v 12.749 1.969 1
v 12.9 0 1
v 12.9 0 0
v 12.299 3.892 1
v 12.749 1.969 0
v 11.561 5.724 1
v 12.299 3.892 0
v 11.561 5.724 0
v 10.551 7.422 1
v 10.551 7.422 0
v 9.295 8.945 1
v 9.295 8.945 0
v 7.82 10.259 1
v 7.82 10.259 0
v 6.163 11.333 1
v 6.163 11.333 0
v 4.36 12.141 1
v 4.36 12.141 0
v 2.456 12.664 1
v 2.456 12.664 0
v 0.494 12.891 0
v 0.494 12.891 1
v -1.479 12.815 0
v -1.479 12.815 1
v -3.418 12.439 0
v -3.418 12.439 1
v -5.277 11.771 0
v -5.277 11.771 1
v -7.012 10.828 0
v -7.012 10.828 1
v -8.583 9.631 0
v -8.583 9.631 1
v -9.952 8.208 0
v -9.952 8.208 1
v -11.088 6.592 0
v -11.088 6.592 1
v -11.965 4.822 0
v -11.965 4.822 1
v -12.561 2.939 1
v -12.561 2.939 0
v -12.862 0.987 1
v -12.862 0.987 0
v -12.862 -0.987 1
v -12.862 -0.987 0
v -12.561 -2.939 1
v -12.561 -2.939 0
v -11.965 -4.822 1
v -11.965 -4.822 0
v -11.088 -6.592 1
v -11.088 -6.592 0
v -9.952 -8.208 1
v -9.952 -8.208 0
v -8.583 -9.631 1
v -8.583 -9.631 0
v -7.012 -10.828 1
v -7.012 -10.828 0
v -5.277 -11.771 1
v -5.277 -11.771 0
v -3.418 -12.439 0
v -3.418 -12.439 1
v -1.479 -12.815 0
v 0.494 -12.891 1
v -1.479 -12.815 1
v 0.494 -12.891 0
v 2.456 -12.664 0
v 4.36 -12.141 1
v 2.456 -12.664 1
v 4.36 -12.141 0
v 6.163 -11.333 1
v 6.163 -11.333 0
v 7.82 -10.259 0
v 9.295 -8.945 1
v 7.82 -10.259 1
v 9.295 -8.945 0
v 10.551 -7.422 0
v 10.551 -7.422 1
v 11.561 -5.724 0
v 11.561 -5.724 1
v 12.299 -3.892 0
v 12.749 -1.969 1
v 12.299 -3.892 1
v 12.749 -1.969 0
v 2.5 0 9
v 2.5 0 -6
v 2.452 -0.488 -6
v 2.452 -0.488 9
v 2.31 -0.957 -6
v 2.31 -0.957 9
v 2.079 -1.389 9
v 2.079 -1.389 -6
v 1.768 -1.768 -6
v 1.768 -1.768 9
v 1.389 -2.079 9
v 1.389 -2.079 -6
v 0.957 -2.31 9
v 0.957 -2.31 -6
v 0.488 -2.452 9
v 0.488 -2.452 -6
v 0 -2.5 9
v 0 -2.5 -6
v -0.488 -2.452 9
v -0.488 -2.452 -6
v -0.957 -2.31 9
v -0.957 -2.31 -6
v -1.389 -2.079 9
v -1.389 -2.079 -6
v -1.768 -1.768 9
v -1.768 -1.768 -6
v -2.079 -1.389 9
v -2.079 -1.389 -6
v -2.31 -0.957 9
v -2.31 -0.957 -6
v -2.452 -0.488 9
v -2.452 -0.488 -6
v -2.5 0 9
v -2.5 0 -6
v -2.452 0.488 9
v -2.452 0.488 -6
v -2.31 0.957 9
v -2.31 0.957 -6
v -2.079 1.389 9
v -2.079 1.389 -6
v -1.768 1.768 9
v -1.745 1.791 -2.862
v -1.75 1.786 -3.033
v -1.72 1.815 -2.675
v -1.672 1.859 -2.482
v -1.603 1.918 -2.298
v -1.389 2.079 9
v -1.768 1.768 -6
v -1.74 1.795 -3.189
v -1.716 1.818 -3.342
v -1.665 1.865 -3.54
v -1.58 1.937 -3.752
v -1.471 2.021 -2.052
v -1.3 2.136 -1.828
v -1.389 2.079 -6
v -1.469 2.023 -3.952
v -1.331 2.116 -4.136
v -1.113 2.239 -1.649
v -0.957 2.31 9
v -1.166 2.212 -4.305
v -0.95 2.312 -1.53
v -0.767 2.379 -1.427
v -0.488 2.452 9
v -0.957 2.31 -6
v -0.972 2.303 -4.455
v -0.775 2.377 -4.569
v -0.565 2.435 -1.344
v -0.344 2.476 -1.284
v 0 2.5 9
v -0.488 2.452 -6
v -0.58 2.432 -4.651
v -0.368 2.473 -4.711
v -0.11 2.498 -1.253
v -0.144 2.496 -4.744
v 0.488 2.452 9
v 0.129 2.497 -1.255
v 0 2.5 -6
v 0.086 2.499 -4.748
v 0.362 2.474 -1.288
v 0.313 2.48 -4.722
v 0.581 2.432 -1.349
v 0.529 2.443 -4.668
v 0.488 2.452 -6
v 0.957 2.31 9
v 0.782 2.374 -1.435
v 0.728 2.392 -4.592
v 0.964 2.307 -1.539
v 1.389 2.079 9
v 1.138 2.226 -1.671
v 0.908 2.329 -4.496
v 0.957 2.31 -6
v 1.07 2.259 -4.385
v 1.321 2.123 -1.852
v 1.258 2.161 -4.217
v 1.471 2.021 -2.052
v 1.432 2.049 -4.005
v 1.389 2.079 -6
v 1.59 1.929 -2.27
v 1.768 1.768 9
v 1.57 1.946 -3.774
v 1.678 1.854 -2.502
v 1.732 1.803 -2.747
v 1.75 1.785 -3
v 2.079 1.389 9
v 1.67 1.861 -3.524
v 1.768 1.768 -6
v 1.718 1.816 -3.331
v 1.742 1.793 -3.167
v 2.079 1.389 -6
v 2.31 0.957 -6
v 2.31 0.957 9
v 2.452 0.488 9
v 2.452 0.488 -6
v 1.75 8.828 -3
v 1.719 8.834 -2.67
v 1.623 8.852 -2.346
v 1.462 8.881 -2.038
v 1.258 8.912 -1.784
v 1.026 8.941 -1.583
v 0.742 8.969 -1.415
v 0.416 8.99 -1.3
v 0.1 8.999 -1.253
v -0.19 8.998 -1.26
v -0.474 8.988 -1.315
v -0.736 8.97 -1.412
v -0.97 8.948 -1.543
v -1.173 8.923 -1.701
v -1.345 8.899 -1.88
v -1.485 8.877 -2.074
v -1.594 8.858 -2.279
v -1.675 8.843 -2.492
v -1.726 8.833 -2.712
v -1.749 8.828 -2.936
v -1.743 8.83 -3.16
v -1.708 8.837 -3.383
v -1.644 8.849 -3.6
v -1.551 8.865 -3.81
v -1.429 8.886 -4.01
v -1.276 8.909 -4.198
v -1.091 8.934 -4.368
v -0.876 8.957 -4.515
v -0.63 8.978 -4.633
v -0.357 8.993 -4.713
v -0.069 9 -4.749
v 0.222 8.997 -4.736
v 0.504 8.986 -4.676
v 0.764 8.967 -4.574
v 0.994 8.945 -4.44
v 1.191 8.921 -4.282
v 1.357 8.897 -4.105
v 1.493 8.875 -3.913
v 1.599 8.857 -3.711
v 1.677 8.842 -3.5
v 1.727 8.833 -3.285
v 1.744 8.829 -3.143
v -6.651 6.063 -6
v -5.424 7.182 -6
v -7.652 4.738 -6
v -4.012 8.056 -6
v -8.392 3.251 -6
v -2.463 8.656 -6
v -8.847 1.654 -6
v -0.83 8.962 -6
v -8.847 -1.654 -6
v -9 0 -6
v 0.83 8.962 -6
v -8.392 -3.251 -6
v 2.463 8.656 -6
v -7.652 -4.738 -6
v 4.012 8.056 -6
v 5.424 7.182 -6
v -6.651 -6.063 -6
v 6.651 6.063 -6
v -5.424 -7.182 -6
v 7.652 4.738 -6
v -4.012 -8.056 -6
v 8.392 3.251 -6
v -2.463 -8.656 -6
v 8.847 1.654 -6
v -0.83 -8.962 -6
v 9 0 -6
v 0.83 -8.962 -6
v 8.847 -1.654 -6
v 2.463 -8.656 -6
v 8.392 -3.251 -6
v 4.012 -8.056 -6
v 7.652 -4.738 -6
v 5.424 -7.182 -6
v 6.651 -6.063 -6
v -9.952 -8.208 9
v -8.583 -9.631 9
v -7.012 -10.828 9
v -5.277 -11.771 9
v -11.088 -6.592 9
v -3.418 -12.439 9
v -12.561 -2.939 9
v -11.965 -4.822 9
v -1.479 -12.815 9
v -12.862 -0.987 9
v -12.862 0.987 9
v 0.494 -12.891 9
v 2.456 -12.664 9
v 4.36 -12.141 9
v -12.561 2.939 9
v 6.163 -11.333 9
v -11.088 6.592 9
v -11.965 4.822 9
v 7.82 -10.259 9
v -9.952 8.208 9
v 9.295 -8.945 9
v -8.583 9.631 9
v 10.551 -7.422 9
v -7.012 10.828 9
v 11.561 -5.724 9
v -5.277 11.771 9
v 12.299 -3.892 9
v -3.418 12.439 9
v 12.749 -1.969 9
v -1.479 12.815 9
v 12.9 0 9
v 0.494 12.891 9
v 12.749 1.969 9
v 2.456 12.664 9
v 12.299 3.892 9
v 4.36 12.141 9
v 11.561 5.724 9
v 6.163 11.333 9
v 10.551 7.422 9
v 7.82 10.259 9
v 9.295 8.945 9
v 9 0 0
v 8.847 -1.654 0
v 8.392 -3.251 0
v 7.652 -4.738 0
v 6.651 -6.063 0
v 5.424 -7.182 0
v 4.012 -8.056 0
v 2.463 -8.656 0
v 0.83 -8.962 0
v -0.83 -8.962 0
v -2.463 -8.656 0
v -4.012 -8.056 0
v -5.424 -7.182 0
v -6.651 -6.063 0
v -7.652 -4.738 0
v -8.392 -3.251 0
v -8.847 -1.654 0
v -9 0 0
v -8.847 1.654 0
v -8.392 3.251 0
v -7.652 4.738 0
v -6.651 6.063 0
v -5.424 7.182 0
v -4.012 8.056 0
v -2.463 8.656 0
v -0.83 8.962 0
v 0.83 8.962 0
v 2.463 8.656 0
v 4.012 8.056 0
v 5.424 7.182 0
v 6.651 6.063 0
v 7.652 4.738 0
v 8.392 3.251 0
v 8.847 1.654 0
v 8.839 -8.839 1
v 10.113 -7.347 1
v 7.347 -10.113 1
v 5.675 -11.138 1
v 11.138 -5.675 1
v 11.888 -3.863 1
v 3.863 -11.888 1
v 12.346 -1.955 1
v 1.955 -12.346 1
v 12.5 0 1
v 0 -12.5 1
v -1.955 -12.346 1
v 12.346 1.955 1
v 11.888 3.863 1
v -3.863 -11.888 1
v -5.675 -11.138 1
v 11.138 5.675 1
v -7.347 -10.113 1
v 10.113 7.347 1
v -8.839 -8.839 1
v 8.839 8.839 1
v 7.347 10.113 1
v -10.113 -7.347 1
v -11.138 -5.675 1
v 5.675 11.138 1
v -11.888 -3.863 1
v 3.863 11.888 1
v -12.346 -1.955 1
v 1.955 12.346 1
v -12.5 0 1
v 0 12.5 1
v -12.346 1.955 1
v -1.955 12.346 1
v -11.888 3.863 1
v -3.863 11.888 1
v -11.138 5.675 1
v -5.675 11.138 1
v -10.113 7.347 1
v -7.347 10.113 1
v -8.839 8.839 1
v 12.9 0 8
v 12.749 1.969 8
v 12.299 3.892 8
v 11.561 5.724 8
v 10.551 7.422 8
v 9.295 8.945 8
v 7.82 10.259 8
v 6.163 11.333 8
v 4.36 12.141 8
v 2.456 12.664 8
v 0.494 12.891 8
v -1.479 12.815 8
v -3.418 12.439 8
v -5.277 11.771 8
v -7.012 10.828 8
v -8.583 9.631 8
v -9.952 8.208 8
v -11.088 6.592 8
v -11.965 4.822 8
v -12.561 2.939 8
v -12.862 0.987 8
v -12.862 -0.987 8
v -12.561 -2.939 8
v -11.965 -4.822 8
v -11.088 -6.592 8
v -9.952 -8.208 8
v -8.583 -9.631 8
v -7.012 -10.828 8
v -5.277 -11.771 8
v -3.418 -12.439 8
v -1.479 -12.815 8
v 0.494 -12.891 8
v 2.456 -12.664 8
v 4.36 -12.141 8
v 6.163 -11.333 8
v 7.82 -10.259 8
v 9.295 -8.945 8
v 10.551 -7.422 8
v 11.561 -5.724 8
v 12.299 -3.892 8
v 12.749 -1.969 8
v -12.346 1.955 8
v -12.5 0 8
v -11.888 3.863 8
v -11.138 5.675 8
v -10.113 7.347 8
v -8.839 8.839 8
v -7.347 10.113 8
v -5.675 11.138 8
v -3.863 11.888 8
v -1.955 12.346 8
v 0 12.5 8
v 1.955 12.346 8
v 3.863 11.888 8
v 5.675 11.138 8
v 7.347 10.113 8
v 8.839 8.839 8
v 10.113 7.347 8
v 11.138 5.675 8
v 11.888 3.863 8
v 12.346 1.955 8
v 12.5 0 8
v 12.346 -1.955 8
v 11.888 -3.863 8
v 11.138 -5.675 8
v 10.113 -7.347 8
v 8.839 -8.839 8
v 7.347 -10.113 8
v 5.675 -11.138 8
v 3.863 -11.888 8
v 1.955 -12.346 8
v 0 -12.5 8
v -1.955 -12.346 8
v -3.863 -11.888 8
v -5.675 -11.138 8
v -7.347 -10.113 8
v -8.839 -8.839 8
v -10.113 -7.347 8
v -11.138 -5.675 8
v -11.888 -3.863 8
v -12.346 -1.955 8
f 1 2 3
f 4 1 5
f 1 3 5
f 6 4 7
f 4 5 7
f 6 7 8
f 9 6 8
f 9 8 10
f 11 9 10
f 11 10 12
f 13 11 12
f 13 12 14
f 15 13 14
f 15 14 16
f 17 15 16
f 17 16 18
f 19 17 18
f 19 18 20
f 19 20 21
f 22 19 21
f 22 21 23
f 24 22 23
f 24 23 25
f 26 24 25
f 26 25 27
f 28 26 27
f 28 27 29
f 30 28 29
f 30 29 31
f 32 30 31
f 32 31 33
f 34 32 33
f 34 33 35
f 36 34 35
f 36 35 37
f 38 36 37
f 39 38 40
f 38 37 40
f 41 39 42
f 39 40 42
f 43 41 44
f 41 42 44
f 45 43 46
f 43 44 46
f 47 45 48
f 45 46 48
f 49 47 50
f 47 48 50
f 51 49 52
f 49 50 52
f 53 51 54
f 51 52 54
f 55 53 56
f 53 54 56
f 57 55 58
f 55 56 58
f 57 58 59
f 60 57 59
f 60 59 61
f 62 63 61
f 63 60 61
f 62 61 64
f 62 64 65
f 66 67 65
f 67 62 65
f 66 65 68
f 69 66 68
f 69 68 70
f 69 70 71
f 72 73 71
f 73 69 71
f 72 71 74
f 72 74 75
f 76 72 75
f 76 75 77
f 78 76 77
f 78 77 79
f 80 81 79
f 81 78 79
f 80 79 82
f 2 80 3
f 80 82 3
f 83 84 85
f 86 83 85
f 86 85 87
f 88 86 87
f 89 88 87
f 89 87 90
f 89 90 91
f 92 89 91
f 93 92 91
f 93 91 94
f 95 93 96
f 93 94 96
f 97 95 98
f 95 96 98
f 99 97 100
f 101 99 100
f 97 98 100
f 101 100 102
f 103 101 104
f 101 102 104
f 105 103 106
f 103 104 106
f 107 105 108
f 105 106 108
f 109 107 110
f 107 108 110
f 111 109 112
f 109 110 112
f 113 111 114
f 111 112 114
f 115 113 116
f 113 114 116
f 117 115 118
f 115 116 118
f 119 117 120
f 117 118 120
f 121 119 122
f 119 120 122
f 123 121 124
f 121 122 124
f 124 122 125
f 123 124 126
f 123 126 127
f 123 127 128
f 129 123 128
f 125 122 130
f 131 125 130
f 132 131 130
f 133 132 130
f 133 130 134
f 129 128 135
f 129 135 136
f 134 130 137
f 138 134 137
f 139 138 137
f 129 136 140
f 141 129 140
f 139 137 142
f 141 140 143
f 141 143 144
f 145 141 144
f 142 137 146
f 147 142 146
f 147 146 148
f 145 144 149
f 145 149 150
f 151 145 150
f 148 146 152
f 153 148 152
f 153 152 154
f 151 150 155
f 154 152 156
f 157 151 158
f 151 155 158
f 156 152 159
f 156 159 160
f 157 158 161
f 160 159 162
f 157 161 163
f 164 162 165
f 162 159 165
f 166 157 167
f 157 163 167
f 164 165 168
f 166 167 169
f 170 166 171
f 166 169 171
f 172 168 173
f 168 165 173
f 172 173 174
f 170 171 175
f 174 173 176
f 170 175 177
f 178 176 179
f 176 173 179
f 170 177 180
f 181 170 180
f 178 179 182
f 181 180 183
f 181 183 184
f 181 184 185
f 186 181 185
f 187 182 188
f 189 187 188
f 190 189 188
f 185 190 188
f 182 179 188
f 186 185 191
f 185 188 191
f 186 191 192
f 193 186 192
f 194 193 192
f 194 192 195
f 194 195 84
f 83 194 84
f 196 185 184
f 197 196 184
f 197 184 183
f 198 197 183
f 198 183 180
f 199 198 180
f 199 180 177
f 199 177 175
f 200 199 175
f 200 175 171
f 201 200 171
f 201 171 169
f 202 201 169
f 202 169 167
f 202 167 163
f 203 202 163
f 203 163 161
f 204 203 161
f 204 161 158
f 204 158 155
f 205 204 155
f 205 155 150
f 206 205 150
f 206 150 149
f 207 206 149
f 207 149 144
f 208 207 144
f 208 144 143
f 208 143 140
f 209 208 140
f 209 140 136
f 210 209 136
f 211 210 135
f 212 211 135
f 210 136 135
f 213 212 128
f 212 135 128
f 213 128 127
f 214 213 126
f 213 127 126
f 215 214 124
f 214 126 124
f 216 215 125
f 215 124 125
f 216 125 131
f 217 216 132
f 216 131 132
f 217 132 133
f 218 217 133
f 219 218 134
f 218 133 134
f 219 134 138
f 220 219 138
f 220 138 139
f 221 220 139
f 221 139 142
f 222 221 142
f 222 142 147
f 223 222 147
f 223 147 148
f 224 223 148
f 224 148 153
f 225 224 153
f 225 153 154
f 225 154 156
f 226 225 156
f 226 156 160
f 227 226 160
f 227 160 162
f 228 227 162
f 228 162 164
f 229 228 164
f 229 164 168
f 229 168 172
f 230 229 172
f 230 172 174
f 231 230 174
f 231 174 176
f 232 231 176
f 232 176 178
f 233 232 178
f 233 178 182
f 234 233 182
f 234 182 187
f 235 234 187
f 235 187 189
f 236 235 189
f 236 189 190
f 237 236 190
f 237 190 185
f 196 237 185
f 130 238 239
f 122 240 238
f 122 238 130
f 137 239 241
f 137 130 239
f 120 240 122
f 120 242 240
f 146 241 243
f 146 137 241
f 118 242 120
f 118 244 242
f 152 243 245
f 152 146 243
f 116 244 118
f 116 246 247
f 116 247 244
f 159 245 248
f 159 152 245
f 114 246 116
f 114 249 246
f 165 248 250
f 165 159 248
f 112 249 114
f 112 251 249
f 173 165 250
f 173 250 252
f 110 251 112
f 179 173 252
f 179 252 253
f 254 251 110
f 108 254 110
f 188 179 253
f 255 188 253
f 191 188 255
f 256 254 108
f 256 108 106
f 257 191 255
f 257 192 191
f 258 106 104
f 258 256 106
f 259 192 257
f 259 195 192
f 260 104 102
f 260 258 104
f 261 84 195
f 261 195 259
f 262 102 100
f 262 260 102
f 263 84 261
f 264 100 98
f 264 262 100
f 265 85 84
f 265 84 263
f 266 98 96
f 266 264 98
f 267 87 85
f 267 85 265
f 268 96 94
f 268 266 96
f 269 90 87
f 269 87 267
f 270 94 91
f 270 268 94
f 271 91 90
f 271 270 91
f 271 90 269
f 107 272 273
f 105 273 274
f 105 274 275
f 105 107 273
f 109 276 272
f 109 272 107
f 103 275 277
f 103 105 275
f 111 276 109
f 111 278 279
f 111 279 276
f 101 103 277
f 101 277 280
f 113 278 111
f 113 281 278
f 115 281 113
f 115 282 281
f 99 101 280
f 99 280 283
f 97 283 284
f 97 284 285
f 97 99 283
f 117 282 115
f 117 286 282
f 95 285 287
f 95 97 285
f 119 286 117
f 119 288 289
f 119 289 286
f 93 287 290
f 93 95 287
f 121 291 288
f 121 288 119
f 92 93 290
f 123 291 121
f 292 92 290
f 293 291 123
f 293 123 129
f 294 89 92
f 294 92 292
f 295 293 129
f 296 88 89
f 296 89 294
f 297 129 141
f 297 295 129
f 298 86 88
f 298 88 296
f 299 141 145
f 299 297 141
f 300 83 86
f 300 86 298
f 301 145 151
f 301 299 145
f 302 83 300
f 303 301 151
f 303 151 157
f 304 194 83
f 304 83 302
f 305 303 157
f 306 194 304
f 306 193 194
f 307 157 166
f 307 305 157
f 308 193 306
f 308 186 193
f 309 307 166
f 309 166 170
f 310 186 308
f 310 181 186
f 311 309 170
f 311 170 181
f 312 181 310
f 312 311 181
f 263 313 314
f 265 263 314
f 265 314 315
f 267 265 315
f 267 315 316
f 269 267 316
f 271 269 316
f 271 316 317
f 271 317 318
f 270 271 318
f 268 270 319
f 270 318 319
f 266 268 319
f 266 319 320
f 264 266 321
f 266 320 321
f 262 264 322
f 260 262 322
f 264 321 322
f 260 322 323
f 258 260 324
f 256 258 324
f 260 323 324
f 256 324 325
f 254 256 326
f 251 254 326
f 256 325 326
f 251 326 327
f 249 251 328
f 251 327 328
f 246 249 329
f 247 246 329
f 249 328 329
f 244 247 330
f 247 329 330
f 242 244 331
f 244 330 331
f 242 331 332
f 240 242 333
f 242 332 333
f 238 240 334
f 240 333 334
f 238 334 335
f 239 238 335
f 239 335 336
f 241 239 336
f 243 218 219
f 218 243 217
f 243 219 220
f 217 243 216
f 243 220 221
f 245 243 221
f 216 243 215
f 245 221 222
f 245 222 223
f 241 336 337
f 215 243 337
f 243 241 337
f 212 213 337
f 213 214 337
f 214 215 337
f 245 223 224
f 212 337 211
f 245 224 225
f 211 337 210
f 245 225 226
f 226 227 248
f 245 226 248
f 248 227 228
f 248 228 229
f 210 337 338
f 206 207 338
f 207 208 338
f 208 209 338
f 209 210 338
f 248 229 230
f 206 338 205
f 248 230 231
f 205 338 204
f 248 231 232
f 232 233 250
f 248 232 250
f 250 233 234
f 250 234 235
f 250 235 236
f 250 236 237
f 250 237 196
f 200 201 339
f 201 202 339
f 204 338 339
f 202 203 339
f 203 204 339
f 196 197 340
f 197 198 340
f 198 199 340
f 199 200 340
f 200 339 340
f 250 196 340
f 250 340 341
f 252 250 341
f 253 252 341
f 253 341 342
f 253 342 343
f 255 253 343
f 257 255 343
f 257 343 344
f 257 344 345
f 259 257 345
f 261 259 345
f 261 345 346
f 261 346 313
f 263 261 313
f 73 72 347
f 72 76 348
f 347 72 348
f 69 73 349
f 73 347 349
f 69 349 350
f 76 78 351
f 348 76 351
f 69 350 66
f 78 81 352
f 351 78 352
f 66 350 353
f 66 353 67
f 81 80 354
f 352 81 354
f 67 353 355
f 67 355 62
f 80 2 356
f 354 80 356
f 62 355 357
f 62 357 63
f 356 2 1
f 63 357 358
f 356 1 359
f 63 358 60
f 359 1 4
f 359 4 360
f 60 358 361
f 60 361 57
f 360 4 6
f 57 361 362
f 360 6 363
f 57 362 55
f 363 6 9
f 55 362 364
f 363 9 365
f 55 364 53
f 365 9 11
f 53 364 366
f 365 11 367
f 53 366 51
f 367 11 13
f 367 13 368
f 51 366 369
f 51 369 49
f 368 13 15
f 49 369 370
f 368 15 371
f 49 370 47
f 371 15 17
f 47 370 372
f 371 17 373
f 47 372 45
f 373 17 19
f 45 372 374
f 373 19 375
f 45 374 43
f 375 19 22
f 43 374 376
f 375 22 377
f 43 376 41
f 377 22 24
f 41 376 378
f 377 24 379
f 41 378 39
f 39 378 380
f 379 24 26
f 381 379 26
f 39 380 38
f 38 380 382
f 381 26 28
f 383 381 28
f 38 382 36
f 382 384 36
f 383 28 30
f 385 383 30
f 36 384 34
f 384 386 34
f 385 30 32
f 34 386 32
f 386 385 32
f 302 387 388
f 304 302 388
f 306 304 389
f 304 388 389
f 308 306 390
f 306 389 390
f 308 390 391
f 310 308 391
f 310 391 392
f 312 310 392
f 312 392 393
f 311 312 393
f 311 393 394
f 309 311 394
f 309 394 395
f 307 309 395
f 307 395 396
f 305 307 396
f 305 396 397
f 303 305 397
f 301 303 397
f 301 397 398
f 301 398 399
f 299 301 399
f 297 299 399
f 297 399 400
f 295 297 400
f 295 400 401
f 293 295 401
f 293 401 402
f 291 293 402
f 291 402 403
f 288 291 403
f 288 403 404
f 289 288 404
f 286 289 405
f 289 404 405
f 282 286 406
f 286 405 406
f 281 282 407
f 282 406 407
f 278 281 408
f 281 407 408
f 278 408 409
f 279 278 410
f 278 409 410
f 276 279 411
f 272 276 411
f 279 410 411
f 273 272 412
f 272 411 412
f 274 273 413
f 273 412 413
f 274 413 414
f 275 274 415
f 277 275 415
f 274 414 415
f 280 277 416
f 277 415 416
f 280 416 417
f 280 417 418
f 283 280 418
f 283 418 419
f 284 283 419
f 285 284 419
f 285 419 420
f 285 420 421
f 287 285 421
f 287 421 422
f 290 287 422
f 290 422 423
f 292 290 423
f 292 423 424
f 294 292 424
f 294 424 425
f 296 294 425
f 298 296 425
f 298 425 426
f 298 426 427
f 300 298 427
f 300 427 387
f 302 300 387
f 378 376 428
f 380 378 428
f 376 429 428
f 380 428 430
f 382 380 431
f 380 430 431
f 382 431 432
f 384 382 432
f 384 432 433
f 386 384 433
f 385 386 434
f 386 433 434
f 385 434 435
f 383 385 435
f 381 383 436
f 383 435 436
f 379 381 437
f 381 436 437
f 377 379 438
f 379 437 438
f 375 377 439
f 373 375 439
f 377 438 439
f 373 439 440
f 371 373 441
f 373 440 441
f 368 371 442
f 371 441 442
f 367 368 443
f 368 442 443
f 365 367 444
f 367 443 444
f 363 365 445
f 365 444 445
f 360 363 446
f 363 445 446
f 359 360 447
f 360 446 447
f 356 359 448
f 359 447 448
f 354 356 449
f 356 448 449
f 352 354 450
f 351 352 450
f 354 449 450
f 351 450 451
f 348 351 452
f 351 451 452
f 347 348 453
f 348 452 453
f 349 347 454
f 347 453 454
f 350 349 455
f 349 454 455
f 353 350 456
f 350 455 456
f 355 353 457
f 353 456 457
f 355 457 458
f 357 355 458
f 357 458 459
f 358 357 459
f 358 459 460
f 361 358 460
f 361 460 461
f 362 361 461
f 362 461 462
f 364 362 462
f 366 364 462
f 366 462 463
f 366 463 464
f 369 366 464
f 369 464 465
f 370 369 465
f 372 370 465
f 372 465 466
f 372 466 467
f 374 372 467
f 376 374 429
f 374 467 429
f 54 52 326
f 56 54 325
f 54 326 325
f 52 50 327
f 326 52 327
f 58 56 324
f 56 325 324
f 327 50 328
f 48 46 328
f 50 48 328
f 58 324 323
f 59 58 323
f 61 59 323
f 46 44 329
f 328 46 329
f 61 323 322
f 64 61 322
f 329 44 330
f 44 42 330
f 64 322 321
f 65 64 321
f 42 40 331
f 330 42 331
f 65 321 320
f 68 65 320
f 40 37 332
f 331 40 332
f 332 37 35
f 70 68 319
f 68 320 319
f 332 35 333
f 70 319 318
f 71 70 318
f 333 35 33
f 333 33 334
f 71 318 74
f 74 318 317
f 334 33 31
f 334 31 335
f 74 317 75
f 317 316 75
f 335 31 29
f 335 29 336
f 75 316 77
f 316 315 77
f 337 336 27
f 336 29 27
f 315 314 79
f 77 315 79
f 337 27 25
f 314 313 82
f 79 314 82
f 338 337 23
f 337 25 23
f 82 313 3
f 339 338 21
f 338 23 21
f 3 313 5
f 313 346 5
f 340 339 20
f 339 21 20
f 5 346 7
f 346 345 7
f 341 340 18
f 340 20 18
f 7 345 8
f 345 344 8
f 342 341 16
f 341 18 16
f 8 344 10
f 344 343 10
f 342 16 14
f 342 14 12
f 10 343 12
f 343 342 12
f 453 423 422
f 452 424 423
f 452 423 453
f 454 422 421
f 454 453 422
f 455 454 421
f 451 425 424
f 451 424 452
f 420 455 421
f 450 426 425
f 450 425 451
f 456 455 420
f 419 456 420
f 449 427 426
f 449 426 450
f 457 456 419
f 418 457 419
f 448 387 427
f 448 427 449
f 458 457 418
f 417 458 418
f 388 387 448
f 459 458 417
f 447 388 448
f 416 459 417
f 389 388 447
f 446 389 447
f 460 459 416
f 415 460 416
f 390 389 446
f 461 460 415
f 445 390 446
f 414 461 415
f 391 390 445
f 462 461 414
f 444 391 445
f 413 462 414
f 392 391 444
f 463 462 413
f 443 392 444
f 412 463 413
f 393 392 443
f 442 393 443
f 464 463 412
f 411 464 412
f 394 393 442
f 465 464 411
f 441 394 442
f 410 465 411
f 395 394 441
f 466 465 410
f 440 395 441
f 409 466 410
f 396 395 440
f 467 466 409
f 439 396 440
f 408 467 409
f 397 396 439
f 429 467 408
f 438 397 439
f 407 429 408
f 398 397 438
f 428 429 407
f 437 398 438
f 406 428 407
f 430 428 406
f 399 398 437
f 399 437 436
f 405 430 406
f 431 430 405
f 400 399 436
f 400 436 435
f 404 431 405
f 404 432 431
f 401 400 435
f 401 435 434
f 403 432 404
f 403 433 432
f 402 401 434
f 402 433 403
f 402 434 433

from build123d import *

# Parameters (mm, degrees)
F0_R     = 12.9
F1_DEPTH = 9
F2_R     = 9
F3_DEPTH = 6
F4_R     = 2.5
F5_DEPTH = 25
F6_W     = 1.571994
F6_H     = 7
F8_R     = 1.75
F9_DEPTH = 25


with BuildPart() as f1:
    # F0 (on Top) → F1 (new body)
    with BuildSketch(Plane.XY):
        Circle(F0_R)
    extrude(amount=F1_DEPTH)

    # F2 (on face) → F3 (join)
    with BuildSketch(Plane(origin=(0, 0, 0), x_dir=(1, 0, 0), z_dir=(0, 0, -1))):
        Circle(F2_R)
    extrude(amount=F3_DEPTH)

    # F4 (on face) → F5 (cut)
    with BuildSketch(Plane(origin=(0, 0, -6), x_dir=(1, 0, 0), z_dir=(0, 0, -1))):
        Circle(F4_R)
    extrude(amount=-F5_DEPTH, mode=Mode.SUBTRACT)

    # F6 (on Front) → F7 (revolve, cut)
    with BuildSketch(Plane.XZ):
        with Locations((-13.285997, 4.5)):
            Rectangle(F6_W, F6_H)
    revolve(axis=Axis((0, 0, 9), (0, 0, -1)), mode=Mode.SUBTRACT)

    # F8 (on Front) → F9 (cut)
    with BuildSketch(Plane.XZ):
        with Locations((0, -3)):
            Circle(F8_R)
    extrude(amount=-F9_DEPTH, mode=Mode.SUBTRACT)


solid = f1.part
